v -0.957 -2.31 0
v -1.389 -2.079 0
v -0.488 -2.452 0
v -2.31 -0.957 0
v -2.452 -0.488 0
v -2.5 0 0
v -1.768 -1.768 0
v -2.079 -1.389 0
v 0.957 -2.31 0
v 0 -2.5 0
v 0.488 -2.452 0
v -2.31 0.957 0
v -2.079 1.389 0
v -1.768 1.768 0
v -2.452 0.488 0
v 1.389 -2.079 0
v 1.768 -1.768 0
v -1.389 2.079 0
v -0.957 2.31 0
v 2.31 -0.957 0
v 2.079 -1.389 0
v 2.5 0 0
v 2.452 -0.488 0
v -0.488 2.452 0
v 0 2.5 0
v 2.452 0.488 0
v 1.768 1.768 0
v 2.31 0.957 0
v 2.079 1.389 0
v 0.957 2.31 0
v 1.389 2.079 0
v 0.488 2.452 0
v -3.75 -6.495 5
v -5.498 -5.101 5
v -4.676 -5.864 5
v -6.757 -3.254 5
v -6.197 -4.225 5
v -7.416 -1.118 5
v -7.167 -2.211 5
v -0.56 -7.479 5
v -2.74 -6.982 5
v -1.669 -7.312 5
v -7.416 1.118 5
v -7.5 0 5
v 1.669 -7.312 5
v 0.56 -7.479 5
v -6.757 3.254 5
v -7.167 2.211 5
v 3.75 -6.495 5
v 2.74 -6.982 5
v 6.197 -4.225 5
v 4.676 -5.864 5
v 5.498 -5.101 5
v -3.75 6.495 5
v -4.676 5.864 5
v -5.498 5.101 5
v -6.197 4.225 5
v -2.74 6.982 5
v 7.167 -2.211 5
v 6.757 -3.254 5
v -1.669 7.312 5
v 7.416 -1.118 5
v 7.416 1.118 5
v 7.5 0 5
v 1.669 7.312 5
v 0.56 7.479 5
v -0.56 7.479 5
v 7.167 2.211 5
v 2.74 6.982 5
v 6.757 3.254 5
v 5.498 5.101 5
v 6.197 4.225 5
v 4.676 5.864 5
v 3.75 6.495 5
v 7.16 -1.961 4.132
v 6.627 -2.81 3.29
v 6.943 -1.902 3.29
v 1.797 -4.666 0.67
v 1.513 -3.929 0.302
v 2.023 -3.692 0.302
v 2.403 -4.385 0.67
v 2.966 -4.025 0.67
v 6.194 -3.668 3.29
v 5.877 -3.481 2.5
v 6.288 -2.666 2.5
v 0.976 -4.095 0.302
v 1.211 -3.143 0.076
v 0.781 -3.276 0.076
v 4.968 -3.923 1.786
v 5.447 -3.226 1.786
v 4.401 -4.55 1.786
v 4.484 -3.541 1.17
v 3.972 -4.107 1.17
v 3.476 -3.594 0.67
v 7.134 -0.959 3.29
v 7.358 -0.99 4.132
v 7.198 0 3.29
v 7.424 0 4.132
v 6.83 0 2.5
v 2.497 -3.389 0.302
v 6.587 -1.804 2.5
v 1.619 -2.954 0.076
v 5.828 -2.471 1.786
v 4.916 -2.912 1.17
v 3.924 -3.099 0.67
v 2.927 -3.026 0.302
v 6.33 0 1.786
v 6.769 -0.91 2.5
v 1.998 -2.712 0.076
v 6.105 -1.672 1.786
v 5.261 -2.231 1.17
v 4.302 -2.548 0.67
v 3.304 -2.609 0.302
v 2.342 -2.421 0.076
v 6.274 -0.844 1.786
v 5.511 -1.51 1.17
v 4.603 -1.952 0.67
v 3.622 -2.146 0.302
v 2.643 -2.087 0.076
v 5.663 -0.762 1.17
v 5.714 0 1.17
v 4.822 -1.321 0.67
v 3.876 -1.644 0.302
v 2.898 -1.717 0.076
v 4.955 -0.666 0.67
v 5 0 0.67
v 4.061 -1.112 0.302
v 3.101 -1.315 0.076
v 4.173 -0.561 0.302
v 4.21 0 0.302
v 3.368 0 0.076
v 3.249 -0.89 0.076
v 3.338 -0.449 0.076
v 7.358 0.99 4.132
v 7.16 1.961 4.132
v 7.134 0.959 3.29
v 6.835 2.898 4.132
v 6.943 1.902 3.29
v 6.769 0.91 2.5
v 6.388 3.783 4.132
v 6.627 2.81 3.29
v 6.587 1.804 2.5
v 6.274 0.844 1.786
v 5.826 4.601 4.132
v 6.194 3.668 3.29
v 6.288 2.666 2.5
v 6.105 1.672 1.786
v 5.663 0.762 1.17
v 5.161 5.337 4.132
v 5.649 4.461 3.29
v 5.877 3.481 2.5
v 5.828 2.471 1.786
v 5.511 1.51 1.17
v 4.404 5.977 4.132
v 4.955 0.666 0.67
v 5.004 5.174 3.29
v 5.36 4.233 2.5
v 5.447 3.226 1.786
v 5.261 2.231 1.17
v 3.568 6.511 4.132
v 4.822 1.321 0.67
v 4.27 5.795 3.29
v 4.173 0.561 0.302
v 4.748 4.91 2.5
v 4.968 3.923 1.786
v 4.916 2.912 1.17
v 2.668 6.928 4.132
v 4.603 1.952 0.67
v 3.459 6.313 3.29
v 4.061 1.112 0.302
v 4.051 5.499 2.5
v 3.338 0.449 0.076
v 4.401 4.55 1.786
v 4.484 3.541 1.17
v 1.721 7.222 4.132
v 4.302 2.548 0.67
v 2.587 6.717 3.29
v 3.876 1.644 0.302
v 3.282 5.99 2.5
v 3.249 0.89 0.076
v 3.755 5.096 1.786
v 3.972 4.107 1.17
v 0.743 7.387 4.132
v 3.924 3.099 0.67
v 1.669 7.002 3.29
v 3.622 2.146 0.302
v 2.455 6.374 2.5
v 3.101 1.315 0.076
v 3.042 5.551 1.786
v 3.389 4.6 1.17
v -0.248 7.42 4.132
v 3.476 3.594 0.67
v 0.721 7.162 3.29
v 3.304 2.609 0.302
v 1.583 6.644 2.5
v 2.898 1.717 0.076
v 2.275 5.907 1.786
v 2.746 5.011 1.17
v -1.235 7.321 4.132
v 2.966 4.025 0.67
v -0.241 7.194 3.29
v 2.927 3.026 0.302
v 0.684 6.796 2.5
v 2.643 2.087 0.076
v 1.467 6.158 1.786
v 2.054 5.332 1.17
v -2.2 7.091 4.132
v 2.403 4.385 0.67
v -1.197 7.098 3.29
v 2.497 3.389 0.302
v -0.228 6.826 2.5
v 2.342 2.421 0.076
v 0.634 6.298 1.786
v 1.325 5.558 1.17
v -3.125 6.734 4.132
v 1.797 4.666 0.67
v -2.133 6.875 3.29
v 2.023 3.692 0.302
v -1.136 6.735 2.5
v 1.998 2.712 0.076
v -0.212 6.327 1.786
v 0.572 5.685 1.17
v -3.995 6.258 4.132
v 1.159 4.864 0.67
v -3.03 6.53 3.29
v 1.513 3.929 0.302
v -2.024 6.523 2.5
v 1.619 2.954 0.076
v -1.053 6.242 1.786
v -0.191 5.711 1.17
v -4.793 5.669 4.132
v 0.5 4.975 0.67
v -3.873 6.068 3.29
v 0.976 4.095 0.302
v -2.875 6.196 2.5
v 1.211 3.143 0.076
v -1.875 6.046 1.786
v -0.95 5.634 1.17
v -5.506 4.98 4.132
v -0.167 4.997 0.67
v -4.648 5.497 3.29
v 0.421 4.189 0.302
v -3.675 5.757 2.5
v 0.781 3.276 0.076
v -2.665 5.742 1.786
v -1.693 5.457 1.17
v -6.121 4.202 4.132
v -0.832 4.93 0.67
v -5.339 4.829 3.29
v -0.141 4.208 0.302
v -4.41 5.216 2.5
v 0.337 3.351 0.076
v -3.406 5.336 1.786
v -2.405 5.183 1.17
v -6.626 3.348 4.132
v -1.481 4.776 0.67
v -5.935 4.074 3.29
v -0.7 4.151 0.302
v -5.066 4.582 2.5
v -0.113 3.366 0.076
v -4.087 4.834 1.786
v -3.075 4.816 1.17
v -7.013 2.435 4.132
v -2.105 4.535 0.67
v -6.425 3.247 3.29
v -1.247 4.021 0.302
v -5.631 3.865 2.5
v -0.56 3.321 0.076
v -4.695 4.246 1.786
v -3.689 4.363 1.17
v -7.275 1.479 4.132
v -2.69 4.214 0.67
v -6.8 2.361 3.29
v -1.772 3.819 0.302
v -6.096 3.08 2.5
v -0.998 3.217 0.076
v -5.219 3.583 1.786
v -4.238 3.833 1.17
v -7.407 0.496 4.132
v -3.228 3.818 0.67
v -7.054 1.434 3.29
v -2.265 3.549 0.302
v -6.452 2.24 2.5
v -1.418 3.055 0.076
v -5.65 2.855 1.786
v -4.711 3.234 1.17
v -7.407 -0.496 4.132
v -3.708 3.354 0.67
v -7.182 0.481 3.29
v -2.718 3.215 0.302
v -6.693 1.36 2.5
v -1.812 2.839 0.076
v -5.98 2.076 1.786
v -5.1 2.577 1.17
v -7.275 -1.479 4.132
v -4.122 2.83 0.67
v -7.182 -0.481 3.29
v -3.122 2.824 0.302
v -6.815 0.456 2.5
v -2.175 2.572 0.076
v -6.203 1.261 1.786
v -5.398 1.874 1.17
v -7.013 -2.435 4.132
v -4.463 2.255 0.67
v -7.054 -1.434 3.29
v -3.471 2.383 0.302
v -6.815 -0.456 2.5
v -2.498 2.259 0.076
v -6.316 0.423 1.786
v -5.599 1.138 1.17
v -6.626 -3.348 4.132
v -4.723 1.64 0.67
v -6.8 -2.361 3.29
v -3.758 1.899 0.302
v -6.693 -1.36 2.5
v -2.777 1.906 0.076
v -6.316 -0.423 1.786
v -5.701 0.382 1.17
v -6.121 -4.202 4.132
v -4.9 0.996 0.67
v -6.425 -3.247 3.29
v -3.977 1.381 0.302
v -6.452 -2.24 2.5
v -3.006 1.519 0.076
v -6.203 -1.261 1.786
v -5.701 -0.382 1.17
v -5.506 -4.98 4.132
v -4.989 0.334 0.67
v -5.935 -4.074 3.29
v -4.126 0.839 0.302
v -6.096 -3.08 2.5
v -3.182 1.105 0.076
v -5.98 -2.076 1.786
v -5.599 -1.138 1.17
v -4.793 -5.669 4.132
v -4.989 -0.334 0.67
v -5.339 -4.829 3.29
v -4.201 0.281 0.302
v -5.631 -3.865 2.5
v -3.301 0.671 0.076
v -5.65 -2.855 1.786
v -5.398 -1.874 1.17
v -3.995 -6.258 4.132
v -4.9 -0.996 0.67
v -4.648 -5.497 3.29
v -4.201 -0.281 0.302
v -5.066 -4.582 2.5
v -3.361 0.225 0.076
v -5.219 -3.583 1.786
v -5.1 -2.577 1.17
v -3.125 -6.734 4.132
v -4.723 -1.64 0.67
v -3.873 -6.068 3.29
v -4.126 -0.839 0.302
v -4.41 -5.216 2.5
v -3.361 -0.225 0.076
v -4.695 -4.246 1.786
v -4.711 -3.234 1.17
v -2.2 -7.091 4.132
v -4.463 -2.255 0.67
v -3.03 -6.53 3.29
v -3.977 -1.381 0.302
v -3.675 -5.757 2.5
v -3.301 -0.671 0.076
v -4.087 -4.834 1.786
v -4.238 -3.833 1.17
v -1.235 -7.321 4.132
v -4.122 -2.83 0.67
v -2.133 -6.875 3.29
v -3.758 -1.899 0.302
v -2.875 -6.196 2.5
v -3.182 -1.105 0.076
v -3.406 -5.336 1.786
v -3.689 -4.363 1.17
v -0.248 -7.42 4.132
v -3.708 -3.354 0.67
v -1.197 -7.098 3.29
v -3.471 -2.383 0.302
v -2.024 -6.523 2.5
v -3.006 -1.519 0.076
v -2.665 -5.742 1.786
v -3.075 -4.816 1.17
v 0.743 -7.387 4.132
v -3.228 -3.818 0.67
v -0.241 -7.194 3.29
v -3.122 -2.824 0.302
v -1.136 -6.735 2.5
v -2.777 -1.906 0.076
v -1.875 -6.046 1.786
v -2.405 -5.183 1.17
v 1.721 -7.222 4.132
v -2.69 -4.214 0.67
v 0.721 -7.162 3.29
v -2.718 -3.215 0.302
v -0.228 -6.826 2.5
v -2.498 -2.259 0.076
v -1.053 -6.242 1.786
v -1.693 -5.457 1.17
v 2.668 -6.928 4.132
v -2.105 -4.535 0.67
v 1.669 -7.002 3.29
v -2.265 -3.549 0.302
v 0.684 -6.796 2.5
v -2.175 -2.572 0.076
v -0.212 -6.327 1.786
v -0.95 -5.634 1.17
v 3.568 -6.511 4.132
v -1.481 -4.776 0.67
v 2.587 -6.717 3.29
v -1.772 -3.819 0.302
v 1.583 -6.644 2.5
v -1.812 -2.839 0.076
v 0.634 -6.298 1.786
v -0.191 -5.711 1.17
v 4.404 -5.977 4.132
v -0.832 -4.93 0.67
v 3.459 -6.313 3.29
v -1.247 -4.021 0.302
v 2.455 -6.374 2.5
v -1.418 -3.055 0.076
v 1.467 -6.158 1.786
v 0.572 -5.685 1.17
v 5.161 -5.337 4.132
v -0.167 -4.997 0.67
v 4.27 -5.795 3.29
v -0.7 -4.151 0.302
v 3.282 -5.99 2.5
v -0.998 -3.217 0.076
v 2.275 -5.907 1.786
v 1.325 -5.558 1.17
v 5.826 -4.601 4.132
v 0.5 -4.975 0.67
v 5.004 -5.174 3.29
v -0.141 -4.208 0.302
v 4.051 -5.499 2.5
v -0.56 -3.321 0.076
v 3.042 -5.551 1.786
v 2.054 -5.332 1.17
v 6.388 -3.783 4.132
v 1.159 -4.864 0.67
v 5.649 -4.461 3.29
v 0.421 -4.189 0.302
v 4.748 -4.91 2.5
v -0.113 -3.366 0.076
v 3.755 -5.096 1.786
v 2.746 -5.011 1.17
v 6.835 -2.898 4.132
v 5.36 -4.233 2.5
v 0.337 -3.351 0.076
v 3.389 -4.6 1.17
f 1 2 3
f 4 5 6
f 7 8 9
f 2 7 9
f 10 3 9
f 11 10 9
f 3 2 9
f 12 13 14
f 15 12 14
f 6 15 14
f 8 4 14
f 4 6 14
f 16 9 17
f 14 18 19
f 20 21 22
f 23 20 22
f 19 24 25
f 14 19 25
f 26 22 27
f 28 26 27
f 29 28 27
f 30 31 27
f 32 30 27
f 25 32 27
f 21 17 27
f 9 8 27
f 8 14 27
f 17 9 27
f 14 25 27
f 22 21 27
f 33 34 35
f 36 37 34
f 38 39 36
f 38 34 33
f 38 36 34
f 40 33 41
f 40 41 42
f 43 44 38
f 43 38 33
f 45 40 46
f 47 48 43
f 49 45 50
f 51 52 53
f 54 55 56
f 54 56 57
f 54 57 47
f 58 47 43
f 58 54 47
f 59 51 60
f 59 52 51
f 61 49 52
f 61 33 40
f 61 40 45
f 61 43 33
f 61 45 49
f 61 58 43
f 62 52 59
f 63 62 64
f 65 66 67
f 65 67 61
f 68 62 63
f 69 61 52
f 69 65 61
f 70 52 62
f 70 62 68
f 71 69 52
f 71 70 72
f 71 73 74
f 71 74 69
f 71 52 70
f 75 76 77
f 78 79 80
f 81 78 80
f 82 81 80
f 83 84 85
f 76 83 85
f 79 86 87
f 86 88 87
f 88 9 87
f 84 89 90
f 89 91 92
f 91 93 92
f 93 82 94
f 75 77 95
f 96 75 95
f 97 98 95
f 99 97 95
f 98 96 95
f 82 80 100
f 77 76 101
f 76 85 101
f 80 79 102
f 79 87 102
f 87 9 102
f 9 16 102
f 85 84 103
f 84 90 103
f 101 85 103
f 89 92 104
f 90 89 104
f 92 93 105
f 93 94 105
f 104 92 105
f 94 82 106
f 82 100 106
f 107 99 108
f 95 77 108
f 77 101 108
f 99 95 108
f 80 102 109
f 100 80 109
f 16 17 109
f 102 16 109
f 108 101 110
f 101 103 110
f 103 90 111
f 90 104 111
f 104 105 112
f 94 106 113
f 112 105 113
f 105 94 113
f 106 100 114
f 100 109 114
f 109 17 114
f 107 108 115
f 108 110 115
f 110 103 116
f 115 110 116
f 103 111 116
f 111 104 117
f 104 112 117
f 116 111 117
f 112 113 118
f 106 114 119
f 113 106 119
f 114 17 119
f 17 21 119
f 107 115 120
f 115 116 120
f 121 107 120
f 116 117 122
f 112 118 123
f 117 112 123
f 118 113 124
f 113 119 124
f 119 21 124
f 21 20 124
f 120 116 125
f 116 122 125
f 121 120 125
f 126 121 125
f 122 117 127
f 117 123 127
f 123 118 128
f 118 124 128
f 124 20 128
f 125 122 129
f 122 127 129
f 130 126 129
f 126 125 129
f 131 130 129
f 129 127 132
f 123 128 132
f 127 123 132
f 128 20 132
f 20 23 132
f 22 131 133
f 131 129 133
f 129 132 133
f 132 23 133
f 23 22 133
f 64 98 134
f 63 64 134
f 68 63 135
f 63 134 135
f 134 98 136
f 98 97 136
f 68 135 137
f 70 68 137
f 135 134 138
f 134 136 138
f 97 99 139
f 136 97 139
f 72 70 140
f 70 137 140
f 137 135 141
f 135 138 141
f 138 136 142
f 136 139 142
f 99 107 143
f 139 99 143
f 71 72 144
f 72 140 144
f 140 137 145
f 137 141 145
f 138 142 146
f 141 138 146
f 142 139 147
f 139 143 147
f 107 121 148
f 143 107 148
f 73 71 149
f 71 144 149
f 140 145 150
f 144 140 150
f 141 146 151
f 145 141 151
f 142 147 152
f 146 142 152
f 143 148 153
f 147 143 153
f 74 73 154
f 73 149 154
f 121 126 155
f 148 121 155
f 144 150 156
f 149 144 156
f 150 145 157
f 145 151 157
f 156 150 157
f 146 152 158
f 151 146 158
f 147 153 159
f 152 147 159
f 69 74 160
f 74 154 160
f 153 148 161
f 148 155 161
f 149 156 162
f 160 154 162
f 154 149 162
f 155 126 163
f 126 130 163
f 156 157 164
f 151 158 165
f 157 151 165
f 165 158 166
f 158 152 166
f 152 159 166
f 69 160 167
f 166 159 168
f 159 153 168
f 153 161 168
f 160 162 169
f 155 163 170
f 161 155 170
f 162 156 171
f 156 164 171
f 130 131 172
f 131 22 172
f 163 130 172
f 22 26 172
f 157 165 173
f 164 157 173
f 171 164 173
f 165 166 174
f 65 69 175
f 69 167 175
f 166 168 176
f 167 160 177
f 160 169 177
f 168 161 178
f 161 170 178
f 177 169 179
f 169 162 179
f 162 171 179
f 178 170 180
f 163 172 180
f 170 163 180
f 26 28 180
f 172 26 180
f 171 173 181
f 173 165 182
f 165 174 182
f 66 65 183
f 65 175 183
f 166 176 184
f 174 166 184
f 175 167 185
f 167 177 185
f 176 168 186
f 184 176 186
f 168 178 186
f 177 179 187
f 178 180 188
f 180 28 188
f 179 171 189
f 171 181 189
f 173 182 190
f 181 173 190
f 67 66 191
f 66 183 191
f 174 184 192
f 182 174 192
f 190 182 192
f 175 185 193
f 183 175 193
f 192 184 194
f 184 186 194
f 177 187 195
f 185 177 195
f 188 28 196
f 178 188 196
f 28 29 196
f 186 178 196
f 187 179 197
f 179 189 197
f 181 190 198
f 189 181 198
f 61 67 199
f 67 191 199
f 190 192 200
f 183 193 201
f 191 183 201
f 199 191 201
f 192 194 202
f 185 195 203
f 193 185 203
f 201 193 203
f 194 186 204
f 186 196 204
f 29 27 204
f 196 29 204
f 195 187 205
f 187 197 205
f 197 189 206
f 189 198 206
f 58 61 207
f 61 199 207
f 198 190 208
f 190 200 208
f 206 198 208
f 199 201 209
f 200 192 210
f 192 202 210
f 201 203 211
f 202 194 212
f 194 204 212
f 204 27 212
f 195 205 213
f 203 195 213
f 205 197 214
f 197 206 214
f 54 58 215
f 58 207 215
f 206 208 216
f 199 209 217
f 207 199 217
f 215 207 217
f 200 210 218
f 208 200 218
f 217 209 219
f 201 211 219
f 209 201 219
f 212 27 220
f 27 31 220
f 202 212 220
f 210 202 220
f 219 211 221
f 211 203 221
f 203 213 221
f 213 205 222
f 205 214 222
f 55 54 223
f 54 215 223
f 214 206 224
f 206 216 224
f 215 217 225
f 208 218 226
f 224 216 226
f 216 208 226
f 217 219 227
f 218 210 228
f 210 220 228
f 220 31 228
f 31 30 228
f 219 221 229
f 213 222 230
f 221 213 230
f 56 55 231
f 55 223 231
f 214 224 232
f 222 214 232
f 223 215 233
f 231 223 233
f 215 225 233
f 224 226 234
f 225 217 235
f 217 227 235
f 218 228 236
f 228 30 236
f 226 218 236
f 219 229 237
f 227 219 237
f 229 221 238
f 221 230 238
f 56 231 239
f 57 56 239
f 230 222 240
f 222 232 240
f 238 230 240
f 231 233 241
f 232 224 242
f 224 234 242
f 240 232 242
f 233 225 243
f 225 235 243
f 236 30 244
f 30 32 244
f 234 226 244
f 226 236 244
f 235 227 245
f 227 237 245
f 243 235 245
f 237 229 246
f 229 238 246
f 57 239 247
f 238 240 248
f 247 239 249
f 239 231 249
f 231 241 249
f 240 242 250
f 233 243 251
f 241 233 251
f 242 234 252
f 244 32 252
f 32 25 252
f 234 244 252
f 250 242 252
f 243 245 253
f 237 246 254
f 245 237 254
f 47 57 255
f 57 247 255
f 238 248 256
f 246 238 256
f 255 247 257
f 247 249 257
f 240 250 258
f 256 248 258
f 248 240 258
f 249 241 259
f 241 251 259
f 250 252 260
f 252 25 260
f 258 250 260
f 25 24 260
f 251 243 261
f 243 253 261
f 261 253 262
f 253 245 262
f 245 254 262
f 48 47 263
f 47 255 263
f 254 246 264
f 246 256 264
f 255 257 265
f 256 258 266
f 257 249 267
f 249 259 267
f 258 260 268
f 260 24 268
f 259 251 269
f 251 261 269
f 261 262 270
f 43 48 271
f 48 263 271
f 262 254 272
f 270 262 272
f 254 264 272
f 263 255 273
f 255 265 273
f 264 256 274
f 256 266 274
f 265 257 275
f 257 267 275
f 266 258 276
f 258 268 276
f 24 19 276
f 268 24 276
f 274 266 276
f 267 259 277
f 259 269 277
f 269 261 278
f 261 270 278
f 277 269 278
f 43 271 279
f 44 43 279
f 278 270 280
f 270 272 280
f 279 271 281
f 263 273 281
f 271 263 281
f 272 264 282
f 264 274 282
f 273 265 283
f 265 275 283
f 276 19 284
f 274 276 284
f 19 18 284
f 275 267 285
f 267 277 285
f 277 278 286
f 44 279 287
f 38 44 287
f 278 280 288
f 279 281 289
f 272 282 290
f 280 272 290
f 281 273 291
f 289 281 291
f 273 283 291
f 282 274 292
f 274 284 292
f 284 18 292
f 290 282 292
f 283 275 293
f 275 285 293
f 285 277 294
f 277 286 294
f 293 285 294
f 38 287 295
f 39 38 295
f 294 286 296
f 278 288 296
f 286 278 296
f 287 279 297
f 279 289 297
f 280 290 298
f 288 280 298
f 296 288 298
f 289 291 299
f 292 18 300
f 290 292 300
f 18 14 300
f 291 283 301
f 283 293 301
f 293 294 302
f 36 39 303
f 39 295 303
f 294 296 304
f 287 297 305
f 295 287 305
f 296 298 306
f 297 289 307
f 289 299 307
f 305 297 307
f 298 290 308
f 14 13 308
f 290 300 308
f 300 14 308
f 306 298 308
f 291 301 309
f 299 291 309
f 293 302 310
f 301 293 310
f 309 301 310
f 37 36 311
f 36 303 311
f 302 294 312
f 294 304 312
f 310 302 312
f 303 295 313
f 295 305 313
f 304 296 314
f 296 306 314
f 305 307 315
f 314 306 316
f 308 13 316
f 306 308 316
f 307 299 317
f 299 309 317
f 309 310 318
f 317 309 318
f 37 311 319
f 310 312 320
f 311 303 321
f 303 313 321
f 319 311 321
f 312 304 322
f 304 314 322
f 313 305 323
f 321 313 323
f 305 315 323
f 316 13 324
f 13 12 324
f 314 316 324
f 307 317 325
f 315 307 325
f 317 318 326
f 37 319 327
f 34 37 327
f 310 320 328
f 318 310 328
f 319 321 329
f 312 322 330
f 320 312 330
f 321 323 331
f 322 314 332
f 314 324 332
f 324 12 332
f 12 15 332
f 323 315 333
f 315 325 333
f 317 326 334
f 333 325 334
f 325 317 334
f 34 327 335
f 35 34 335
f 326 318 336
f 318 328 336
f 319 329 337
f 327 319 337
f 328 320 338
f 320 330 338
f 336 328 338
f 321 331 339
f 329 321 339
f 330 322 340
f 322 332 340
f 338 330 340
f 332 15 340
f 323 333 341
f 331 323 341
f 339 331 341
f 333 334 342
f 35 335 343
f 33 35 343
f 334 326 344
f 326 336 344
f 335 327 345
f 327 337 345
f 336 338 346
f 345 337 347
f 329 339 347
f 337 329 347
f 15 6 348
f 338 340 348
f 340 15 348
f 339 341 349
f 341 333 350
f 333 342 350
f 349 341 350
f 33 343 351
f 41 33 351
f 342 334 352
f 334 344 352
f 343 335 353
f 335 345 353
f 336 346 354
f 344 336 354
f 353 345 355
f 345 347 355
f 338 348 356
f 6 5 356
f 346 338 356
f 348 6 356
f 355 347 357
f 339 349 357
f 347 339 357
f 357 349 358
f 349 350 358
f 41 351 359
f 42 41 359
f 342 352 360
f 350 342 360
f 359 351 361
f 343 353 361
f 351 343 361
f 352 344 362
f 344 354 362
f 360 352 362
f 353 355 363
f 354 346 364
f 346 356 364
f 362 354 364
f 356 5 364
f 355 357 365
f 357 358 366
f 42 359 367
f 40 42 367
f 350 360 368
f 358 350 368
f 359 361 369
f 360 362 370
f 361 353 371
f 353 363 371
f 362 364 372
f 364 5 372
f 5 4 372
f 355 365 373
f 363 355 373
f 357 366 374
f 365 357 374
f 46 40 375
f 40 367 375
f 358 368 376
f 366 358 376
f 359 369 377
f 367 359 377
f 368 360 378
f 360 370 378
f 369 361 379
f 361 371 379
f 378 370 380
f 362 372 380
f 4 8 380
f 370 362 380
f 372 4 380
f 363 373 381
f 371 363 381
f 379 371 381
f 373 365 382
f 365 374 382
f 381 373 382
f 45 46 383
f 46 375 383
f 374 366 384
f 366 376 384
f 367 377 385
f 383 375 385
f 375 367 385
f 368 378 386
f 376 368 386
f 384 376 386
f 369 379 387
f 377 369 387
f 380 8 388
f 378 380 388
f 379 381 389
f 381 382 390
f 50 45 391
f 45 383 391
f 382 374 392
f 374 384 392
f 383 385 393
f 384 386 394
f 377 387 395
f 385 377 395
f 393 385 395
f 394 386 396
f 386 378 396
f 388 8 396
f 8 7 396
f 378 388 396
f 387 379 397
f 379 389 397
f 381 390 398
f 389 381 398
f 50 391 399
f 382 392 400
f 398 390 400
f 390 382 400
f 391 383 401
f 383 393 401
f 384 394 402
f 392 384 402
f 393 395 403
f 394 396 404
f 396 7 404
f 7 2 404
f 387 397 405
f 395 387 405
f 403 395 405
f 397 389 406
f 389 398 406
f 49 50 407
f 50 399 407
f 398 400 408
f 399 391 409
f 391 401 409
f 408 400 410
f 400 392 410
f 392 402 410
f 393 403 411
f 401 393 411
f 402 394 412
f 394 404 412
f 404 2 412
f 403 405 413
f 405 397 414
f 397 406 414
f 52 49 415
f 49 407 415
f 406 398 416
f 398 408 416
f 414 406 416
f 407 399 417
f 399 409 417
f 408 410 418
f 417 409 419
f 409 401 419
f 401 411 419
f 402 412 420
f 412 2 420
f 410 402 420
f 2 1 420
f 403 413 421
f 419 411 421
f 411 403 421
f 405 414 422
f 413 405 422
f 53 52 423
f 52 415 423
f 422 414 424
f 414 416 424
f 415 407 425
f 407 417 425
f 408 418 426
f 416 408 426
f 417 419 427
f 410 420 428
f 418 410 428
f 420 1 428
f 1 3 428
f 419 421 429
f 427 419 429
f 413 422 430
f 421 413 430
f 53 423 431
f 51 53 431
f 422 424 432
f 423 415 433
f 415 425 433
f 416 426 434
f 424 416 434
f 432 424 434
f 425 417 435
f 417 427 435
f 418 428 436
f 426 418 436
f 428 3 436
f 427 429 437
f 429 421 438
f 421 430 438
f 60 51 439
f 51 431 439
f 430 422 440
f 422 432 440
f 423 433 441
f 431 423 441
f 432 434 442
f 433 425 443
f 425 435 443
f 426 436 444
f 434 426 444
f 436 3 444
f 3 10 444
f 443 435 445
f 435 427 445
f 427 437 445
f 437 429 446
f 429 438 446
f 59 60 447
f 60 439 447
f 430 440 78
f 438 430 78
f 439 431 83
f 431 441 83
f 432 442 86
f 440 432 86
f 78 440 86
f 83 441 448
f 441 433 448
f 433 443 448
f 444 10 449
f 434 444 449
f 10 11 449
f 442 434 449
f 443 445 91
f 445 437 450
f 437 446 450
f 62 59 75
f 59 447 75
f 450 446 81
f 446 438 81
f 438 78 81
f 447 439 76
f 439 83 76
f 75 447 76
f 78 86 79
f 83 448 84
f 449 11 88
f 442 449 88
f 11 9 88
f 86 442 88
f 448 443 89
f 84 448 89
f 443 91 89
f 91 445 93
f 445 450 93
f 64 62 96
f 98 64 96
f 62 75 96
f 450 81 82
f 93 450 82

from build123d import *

# Parameters (mm, degrees)
F0_R     = 5
F1_DEPTH = 5
F0_R_2   = 7.5
F2_DEPTH = 5
F3_R     = 4.99999


# Not quite as in the source:
# - a fillet or chamfer is up to 0.001 mm smaller than in the source, because OpenCascade refuses the exact size


with BuildPart() as f1:
    # F0 (on Top) → F1 (new body)
    with BuildSketch(Plane.XY):
        Circle(F0_R)
    extrude(amount=F1_DEPTH)

    # F0 (on Top) → F2 (join)
    with BuildSketch(Plane.XY):
        Circle(F0_R_2)
        Circle(F0_R, mode=Mode.SUBTRACT)
    extrude(amount=F2_DEPTH)

    # F3 (radius 5 in the source; OpenCascade refuses exactly that, so slightly less here)
    f3_edges = [f1.edges().sort_by_distance(p)[0] for p in [
        (-7.5, 0, 0),
    ]]
    fillet(f3_edges, radius=F3_R)


solid = f1.part
